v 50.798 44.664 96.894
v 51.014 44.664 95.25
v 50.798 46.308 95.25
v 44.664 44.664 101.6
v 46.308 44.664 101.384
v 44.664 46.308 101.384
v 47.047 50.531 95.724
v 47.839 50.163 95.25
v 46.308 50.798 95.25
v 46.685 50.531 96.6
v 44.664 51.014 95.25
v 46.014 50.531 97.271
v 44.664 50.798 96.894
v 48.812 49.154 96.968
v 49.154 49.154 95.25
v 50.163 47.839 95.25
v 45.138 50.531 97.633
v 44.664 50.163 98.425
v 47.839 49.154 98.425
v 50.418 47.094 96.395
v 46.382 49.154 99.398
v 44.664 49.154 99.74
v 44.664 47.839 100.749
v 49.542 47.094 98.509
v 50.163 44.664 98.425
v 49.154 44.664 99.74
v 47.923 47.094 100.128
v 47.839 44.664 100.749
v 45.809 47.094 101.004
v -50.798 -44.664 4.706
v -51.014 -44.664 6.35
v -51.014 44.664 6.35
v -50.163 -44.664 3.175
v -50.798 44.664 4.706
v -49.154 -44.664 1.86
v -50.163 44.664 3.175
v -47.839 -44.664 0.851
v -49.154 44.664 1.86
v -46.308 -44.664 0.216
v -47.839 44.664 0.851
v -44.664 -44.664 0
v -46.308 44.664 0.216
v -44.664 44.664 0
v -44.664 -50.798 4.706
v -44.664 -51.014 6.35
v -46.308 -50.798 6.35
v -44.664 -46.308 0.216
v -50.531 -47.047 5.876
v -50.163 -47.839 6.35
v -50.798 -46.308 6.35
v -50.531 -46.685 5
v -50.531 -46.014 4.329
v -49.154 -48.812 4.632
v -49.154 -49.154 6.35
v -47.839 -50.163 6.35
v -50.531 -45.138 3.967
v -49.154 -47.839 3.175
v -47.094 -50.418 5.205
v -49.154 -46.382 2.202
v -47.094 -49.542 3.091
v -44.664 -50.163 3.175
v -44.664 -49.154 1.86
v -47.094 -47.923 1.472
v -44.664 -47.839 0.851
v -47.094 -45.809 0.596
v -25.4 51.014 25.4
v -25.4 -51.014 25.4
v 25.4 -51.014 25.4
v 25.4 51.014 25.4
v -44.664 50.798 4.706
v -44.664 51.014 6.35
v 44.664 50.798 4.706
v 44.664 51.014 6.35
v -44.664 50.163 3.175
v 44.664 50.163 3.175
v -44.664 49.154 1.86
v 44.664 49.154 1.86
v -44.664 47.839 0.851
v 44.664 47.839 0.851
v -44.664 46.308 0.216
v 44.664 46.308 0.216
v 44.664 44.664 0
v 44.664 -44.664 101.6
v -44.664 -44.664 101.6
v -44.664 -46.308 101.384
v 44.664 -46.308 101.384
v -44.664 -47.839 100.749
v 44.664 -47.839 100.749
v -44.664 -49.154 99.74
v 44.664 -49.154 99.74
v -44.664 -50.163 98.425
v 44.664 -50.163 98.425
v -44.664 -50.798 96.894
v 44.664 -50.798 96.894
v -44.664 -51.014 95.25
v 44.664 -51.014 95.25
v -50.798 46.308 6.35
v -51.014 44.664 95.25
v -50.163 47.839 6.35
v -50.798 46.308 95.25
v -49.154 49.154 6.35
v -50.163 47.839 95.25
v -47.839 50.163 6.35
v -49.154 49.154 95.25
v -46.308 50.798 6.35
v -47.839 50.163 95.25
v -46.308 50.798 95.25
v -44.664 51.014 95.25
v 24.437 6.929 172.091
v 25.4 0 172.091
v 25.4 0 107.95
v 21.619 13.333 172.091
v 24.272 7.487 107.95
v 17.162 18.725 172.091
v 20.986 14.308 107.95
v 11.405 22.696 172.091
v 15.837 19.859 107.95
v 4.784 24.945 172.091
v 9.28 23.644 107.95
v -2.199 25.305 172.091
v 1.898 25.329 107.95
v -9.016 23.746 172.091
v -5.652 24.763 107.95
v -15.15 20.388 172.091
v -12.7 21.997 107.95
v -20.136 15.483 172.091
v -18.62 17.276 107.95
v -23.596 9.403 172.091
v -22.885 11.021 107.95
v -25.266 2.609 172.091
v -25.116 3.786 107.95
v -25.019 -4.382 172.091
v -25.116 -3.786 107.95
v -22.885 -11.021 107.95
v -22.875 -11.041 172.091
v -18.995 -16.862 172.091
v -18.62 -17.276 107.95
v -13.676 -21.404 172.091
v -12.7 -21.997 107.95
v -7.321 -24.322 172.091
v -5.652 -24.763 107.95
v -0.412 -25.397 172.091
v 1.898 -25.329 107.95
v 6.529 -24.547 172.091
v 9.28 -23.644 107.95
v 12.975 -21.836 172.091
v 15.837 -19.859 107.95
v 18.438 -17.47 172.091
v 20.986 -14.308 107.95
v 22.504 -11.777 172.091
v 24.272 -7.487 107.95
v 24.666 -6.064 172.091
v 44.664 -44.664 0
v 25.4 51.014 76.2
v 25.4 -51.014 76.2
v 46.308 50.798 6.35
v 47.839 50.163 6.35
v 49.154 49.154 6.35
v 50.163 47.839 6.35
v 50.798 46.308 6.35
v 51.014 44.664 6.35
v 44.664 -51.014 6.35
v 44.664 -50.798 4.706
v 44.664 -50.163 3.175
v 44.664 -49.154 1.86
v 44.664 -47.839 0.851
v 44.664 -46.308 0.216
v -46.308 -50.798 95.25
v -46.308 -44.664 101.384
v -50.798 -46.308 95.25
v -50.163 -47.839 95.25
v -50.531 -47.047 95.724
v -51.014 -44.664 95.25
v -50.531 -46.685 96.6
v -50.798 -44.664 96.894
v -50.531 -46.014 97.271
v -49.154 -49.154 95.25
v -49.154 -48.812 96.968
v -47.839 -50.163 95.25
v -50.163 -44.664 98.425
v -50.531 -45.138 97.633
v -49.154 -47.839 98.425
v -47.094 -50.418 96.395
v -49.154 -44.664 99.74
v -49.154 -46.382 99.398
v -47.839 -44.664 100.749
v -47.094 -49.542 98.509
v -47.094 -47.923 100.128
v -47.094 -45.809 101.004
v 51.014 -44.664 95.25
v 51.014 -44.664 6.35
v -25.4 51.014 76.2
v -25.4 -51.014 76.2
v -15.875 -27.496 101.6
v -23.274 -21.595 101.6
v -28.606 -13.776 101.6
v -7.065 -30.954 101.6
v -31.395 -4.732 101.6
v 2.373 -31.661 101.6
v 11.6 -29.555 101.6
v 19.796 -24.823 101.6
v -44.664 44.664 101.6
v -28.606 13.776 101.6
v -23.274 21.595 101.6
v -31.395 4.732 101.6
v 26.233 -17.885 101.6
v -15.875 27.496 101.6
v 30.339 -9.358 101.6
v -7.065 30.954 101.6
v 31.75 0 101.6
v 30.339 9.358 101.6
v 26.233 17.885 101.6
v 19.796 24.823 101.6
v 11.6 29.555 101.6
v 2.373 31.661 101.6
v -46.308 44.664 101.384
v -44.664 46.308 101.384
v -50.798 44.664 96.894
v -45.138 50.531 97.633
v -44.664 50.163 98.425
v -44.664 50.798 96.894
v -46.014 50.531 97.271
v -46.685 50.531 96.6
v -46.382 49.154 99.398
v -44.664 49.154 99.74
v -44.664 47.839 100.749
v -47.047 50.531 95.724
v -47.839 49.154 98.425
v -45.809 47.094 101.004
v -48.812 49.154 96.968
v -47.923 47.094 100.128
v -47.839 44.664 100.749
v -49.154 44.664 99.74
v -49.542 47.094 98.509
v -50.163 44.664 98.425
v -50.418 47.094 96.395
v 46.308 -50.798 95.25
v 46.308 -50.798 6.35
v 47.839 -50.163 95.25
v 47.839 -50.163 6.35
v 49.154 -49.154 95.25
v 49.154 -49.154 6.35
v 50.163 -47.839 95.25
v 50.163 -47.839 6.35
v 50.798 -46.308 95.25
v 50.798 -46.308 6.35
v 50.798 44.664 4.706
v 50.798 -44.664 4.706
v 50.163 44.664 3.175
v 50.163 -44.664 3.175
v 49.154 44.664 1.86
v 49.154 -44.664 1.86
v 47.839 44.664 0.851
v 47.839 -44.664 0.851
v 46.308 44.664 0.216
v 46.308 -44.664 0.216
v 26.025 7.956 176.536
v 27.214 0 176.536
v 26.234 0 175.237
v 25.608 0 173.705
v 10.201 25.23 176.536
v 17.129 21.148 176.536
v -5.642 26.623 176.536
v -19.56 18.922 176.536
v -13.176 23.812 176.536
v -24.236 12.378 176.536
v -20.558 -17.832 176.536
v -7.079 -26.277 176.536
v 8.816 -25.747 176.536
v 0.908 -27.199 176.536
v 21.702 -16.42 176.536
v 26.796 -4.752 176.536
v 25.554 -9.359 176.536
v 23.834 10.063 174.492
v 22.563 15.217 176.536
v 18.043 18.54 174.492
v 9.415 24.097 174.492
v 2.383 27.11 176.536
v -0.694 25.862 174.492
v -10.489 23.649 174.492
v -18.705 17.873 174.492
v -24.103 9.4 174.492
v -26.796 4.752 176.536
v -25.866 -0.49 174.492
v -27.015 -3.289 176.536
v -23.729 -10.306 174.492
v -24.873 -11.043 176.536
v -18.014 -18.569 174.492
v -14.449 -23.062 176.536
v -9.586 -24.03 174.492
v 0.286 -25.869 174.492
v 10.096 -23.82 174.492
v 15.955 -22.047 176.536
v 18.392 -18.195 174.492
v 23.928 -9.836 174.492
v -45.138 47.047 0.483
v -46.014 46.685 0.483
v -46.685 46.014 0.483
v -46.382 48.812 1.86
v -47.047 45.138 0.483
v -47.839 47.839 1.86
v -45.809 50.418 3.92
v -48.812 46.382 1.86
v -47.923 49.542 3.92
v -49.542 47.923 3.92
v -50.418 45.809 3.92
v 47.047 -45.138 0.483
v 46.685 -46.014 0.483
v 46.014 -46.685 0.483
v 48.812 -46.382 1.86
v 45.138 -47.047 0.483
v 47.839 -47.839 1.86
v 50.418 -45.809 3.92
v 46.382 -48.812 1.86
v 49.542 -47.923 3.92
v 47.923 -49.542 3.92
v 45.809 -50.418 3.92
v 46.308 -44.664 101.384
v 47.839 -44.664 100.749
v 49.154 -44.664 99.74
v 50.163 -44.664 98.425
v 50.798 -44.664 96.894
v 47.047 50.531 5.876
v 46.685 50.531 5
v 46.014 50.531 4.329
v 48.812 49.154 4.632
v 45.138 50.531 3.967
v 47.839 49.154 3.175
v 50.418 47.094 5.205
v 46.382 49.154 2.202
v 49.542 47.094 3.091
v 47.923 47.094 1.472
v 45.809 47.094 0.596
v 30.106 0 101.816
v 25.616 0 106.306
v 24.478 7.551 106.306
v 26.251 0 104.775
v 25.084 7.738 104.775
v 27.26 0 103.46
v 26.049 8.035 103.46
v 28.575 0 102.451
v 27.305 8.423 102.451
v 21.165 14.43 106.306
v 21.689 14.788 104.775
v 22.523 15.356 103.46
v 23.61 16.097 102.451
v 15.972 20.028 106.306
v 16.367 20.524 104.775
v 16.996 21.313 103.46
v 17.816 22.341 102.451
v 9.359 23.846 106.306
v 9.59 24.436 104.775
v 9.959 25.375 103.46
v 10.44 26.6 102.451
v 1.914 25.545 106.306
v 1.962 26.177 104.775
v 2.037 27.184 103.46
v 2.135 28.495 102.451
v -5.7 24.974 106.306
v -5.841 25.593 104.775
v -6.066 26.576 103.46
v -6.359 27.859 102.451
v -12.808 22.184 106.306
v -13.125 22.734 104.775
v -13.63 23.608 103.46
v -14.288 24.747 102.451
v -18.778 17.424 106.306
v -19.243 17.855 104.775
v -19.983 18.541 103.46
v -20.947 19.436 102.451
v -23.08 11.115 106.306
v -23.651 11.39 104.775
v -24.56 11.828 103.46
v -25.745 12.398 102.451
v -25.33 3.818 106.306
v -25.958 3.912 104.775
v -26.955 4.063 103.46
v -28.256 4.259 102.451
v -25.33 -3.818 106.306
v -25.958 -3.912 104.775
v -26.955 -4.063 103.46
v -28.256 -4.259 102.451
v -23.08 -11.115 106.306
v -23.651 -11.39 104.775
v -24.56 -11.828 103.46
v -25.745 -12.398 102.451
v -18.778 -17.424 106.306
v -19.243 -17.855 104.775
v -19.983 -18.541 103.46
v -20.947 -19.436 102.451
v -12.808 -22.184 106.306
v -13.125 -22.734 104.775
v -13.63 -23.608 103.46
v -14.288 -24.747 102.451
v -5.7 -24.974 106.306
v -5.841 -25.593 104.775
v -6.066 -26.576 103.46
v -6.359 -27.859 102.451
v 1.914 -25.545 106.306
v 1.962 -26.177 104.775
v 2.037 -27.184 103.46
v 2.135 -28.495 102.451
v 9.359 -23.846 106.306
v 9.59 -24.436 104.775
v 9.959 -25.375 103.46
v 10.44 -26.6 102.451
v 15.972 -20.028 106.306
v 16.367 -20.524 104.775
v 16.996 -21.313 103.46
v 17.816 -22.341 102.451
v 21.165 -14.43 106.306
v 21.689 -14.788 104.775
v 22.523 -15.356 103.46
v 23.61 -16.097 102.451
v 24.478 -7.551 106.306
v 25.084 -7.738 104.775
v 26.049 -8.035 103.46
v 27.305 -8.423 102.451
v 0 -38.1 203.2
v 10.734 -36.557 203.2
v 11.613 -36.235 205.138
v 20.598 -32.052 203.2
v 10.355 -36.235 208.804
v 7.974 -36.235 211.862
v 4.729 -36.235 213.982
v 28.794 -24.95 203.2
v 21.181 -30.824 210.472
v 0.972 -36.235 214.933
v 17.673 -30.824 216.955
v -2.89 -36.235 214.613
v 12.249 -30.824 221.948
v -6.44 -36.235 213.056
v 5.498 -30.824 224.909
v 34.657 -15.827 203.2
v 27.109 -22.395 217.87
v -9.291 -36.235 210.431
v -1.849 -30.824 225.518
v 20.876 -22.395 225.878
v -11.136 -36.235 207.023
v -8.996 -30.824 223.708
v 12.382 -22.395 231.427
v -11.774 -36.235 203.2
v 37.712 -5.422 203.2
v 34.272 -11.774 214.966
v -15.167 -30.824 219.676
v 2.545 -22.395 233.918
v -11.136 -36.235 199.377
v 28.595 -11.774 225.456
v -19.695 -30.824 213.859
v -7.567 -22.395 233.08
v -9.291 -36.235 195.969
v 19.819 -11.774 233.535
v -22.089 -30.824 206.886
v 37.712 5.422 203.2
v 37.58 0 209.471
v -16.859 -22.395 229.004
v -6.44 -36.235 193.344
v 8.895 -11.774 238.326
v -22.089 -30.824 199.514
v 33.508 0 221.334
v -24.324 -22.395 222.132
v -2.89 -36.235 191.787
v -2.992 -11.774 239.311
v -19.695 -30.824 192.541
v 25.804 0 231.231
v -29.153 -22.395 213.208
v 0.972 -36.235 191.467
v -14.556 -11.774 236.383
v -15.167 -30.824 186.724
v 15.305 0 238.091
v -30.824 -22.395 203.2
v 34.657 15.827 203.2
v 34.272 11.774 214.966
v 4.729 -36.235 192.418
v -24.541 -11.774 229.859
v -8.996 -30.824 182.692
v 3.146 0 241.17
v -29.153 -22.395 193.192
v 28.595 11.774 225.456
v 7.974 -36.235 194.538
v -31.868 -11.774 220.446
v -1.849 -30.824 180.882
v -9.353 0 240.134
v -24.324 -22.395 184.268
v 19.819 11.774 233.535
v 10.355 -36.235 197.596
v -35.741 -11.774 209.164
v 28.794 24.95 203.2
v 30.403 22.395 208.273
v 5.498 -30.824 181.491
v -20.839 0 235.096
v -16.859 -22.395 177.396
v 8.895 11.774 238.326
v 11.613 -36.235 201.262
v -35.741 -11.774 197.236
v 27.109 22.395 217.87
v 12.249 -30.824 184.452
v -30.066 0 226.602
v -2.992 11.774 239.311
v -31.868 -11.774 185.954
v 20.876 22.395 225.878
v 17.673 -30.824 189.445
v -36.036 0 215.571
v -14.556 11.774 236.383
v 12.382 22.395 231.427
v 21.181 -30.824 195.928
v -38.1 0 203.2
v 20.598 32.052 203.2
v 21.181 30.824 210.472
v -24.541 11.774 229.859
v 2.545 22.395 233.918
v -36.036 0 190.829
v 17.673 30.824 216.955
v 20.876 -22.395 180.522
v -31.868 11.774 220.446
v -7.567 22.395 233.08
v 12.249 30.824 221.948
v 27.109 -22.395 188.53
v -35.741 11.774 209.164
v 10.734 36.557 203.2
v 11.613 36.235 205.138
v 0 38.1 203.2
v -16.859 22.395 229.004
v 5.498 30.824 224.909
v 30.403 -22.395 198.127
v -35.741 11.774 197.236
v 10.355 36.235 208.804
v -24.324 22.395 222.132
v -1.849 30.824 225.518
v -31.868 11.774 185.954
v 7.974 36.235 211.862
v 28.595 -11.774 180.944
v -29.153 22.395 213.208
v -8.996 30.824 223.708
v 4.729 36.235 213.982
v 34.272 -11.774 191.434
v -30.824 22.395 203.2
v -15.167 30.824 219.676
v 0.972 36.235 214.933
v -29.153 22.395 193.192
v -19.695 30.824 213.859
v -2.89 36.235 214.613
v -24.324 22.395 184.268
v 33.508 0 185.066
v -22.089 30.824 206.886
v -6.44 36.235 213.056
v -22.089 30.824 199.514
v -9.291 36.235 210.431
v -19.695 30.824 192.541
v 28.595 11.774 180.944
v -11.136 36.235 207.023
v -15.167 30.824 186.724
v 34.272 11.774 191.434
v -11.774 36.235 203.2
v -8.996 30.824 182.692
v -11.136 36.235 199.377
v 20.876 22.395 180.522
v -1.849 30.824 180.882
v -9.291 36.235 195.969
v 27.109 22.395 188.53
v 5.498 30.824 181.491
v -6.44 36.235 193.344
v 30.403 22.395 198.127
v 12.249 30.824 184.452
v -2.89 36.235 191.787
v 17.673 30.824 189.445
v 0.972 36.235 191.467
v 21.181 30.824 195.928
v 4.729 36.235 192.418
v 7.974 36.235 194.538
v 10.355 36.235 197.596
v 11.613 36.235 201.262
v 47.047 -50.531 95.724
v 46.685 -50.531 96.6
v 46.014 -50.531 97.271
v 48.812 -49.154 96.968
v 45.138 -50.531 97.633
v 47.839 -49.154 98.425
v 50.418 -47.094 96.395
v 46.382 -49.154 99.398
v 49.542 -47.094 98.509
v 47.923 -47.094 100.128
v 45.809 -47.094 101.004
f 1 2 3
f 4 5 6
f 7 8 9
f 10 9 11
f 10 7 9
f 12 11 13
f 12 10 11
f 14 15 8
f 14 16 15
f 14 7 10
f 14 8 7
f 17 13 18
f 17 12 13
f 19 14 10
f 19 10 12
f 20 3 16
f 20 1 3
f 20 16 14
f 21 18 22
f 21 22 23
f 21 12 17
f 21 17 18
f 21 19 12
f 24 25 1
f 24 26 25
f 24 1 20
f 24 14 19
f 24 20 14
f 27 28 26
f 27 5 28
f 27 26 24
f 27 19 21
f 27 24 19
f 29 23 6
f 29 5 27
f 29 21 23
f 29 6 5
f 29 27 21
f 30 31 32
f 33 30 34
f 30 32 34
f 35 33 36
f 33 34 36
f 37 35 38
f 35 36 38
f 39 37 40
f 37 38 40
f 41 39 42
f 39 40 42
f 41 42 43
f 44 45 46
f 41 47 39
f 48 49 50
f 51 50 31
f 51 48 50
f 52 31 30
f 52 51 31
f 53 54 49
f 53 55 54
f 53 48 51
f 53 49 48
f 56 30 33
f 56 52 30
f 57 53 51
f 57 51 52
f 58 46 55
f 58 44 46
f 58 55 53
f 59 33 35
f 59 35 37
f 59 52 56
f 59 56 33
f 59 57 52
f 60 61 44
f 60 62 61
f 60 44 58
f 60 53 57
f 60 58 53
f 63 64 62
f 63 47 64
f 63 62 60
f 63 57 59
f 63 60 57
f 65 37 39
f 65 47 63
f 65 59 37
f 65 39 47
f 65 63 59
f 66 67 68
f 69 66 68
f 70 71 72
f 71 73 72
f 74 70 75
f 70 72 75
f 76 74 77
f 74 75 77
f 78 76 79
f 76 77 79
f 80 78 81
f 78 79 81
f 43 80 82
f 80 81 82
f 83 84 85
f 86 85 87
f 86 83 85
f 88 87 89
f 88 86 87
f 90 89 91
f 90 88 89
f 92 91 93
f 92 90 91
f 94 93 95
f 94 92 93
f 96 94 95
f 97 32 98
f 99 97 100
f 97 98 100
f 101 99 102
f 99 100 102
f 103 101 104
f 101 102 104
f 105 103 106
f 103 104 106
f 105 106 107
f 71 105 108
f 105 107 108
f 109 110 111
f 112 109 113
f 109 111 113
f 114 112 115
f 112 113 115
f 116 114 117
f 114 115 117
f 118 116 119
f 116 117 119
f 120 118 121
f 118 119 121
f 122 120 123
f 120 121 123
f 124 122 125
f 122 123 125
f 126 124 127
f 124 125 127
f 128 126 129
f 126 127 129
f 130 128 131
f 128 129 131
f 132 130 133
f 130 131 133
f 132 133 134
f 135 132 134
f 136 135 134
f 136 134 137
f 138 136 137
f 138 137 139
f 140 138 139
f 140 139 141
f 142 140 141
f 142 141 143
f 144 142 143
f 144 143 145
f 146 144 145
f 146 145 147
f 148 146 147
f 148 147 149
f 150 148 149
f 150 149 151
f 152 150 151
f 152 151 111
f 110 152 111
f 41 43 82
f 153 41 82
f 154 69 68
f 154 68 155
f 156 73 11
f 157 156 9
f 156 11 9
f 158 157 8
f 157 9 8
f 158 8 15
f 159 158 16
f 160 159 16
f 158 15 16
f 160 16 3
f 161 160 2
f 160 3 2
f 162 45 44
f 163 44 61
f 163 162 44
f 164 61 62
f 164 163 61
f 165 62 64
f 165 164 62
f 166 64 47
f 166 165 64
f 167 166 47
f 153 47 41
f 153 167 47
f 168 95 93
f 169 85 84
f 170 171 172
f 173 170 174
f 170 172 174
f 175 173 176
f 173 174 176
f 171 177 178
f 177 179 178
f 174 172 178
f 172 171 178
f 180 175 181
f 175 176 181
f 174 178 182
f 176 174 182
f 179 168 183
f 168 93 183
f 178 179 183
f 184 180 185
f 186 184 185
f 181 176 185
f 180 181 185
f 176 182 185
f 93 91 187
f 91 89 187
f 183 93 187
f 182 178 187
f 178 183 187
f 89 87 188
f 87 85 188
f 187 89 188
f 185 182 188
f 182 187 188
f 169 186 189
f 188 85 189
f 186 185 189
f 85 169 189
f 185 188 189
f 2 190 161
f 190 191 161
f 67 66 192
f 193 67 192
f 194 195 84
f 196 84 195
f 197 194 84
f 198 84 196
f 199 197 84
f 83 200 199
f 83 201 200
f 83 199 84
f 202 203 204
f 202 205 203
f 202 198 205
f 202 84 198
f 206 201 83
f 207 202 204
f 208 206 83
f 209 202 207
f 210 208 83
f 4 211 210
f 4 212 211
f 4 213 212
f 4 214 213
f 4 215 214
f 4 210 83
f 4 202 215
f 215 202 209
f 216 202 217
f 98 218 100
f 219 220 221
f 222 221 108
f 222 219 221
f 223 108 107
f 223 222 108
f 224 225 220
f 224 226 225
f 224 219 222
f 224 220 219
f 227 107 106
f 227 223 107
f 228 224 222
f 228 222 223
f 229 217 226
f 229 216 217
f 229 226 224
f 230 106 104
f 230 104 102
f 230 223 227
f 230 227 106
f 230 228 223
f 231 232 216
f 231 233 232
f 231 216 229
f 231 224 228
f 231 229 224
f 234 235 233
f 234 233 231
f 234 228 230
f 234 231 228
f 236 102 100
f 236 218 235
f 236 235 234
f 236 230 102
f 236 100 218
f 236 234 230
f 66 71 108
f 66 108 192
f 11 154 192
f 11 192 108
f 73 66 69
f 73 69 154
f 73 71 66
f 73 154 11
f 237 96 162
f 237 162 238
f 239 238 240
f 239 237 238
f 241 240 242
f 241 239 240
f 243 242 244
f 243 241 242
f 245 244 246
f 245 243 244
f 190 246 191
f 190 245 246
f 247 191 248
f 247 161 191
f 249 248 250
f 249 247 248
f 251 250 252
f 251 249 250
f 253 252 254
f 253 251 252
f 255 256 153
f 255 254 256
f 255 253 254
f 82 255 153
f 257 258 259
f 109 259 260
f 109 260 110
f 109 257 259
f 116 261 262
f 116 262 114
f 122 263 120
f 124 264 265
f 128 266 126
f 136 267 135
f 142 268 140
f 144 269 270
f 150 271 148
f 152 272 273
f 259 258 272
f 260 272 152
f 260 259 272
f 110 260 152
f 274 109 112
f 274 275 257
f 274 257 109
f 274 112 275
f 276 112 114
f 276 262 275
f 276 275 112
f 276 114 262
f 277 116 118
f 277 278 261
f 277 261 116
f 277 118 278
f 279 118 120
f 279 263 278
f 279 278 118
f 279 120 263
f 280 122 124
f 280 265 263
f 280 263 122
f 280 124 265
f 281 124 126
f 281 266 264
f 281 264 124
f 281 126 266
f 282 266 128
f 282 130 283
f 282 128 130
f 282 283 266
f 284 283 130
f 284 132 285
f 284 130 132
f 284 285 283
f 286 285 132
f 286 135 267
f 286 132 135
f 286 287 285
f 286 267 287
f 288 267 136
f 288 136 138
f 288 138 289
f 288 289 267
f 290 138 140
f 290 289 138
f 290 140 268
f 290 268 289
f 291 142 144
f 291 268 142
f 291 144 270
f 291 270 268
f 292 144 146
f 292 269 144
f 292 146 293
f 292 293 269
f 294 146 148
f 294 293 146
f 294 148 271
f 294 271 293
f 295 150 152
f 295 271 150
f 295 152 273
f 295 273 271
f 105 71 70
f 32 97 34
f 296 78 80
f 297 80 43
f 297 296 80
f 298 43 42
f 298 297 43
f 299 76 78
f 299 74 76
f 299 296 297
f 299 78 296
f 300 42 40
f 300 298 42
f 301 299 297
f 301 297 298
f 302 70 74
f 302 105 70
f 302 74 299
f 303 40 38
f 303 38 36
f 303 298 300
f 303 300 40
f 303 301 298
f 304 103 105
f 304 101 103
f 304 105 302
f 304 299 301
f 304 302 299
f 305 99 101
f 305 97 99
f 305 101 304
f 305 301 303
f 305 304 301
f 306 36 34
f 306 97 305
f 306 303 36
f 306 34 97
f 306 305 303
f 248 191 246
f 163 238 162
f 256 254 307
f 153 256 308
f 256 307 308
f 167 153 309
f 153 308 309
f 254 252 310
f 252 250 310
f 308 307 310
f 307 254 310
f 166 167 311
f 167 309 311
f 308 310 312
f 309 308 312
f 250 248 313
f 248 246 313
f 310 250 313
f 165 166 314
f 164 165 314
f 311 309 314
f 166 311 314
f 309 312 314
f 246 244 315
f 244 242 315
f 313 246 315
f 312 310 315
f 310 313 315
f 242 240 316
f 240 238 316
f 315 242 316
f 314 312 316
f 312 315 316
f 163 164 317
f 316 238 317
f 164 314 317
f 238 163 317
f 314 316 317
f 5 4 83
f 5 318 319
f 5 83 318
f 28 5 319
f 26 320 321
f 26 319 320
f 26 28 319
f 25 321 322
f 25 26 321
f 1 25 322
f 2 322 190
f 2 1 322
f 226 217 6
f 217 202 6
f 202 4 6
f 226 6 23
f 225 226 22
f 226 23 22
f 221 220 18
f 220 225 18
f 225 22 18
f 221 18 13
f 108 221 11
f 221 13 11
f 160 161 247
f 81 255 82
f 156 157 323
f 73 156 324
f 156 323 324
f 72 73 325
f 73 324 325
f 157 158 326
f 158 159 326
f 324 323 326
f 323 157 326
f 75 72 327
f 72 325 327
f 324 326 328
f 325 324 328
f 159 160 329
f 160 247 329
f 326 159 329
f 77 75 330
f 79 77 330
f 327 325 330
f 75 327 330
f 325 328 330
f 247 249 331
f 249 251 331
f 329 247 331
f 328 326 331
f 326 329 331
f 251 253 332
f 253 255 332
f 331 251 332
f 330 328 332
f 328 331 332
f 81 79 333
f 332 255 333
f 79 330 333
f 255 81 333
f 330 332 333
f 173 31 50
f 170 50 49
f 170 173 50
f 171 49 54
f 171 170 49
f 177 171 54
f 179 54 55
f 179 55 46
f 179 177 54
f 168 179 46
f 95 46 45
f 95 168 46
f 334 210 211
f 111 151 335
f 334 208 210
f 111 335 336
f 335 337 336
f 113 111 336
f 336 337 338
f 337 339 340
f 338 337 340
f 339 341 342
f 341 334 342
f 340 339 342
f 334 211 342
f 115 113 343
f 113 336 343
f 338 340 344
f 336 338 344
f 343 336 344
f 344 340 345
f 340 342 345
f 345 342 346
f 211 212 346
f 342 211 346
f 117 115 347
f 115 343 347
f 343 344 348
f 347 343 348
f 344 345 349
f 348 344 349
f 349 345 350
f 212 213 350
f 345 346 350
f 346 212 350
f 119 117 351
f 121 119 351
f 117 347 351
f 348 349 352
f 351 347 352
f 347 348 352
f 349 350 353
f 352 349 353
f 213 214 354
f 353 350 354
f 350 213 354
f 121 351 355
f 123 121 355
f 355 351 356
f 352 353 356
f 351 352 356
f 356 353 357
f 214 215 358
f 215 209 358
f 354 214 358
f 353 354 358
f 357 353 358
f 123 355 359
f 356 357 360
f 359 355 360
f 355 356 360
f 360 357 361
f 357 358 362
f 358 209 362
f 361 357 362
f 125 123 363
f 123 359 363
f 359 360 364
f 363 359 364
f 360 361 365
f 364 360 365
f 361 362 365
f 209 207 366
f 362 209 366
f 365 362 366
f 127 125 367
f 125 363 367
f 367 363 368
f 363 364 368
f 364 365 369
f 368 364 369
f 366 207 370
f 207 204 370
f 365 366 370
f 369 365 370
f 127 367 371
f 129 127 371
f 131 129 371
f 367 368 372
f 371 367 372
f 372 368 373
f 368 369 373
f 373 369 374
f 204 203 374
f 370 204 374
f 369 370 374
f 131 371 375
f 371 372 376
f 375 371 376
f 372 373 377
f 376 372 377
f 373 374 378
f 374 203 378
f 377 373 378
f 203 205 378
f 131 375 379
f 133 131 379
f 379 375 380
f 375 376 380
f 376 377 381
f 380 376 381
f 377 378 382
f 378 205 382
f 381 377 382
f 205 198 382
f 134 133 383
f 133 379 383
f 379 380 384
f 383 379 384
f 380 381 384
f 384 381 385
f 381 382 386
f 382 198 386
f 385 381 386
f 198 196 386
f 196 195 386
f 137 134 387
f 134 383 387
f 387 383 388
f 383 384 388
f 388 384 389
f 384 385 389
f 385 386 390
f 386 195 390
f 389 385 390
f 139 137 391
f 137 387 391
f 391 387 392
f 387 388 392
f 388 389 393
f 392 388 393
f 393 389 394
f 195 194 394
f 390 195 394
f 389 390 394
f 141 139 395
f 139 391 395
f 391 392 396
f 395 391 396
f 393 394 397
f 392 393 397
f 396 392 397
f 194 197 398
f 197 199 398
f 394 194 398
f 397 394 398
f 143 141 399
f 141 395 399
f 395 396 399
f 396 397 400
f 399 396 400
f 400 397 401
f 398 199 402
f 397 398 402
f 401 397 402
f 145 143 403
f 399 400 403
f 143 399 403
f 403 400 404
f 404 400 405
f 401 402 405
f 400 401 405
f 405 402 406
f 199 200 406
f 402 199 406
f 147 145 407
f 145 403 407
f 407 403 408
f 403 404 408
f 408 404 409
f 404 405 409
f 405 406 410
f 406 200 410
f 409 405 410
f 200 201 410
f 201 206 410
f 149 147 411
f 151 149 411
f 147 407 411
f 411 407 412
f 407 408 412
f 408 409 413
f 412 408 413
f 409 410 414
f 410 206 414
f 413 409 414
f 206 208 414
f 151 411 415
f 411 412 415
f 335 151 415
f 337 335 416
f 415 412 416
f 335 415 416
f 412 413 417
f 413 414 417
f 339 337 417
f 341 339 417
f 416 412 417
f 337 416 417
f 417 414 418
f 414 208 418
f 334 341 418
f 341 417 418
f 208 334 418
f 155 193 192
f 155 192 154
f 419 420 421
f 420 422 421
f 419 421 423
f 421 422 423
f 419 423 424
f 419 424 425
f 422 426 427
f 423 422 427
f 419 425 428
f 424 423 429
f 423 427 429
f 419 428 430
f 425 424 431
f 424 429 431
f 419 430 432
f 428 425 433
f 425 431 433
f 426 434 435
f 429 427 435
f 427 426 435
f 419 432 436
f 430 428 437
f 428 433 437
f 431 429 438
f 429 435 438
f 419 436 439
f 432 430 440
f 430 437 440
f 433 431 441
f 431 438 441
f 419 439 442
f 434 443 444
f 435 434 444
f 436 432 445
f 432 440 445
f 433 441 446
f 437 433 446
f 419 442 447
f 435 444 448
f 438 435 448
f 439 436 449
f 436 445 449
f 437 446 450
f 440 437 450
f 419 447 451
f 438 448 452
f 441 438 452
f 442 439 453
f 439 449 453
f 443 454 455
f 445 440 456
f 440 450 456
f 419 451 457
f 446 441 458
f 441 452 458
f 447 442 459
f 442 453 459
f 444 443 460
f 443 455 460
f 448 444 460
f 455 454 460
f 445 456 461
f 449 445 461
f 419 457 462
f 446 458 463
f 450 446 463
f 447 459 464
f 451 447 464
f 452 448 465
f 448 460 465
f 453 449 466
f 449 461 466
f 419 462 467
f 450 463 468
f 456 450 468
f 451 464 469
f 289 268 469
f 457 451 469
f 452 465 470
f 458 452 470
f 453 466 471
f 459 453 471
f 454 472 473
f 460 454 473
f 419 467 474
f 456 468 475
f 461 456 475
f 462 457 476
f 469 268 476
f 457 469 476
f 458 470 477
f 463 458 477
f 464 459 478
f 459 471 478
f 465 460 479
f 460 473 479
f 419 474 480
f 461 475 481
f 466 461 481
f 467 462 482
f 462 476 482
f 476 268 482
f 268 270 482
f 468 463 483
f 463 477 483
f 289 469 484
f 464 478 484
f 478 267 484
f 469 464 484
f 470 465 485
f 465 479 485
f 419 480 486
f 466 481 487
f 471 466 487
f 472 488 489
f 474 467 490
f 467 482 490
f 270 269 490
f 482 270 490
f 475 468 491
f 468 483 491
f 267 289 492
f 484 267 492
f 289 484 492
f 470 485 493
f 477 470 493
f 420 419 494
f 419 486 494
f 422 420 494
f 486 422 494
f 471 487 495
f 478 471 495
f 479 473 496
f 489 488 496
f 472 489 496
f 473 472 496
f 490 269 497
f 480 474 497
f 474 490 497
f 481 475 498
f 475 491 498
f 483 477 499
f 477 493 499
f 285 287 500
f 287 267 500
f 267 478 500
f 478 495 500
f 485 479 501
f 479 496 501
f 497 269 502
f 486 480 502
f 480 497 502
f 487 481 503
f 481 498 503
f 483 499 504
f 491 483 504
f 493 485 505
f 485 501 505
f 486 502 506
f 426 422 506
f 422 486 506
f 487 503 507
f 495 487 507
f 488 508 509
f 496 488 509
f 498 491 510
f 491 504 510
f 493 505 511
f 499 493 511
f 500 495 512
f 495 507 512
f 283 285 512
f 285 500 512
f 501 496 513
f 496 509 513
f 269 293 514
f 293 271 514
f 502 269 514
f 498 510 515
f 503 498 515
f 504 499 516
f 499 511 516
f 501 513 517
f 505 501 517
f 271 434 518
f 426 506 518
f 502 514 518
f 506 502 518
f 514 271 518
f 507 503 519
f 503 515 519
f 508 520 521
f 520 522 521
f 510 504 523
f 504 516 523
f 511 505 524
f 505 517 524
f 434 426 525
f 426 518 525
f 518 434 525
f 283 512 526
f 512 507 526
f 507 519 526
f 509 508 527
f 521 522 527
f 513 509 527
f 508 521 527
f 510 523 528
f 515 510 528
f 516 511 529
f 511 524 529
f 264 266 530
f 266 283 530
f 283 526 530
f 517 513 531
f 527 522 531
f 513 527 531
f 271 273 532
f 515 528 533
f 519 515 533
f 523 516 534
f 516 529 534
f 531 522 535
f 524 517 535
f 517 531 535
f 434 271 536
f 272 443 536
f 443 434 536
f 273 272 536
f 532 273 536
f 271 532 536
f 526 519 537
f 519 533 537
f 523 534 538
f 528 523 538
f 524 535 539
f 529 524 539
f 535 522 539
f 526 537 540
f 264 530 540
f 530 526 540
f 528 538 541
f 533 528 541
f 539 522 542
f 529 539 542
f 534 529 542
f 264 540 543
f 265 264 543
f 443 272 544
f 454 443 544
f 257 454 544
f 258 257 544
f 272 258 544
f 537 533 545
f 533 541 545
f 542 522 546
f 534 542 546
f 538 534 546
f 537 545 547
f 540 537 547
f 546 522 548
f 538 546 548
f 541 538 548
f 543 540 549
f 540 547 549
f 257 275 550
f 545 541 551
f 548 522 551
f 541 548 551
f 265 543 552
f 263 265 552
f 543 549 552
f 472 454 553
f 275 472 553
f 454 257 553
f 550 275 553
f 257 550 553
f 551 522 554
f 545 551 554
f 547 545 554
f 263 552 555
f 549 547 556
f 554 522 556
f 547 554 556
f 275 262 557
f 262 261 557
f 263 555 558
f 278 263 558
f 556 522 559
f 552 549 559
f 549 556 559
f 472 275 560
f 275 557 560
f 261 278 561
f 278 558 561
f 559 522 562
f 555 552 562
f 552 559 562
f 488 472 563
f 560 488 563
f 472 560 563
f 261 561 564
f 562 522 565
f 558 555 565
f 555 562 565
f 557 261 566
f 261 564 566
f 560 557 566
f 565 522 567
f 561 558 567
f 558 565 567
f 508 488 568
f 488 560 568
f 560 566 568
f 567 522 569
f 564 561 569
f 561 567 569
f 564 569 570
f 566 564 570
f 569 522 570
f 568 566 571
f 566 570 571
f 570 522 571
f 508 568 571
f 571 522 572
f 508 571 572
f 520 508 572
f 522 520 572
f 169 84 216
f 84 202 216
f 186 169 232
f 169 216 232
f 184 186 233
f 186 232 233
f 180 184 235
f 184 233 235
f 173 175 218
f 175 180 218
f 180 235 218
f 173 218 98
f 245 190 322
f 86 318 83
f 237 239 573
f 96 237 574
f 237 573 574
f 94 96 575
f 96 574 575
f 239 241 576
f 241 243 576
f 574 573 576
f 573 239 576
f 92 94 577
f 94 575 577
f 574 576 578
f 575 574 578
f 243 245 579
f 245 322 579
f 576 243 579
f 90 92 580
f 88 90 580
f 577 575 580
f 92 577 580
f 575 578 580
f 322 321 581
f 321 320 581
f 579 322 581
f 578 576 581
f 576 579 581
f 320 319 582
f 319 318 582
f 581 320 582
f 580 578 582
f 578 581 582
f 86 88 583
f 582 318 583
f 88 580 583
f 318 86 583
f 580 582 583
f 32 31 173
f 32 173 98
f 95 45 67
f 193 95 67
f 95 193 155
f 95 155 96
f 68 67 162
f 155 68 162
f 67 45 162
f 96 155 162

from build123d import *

# Parameters (mm, degrees)
F0_W     = 102.0282506943
F0_H     = 102.0282581449
F1_DEPTH = 101.6
F2_R     = 25.4
F3_DEPTH = 101.6
F6_W     = 50.8
F6_H     = 50.8
F7_DEPTH = 130.048
F8_R     = 6.35


with BuildPart() as f1:
    # F0 (on Top) → F1 (new body)
    with BuildSketch(Plane.XY):
        Rectangle(F0_W, F0_H)
    extrude(amount=F1_DEPTH)

    # F2 (on face) → F3 (join)
    with BuildSketch(Plane.XY.offset(101.6)):
        Circle(F2_R)
    extrude(amount=F3_DEPTH)

    # F4 (on face) → F5 (revolve)
    with BuildSketch(Plane.XY.offset(203.2)):
        with BuildLine():
            Line((0, -25.4), (0, -38.1))
            ThreePointArc((0, -38.1), (38.1, 0), (0, 38.1))
            Line((0, 38.1), (0, 25.4))
            ThreePointArc((0, 25.4), (17.9605122421, 17.9605122421), (25.4, 0))
            ThreePointArc((25.4, 0), (17.9605122421, -17.9605122421), (0, -25.4))
        make_face()
        with BuildLine():
            ThreePointArc((0, 25.4), (-25.4, 0), (0, -25.4))
            Line((0, -25.4), (0, 0))
            Line((0, 0), (0, 25.4))
        make_face()
    revolve(axis=Axis((0, 0, 203.2), (0, -1, 0)))

    # F6 (on face) → F7 (cut)
    with BuildSketch(Plane.XZ.offset(51.0141290724)):
        with Locations((0, 50.8)):
            Rectangle(F6_W, F6_H)
    extrude(amount=-F7_DEPTH, mode=Mode.SUBTRACT)

    # F8
    f8_edges = [f1.edges().sort_by_distance(p)[0] for p in [
        (51.014125, 0, 101.6),
        (51.014125, -51.014129, 50.8),
        (51.014125, 0, 0),
        (51.014125, 51.014129, 50.8),
        (0, -51.014129, 101.6),
        (0, -51.014129, 0),
        (-51.014125, -51.014129, 50.8),
        (-51.014125, 0, 101.6),
        (0, 51.014129, 101.6),
        (-51.014125, 51.014129, 50.8),
        (0, 51.014129, 0),
        (-51.014125, 0, 0),
        (-25.4, 0, 101.6),
        (-25.4, 0, 174.801937),
    ]]
    fillet(f8_edges, radius=F8_R)


solid = f1.part
